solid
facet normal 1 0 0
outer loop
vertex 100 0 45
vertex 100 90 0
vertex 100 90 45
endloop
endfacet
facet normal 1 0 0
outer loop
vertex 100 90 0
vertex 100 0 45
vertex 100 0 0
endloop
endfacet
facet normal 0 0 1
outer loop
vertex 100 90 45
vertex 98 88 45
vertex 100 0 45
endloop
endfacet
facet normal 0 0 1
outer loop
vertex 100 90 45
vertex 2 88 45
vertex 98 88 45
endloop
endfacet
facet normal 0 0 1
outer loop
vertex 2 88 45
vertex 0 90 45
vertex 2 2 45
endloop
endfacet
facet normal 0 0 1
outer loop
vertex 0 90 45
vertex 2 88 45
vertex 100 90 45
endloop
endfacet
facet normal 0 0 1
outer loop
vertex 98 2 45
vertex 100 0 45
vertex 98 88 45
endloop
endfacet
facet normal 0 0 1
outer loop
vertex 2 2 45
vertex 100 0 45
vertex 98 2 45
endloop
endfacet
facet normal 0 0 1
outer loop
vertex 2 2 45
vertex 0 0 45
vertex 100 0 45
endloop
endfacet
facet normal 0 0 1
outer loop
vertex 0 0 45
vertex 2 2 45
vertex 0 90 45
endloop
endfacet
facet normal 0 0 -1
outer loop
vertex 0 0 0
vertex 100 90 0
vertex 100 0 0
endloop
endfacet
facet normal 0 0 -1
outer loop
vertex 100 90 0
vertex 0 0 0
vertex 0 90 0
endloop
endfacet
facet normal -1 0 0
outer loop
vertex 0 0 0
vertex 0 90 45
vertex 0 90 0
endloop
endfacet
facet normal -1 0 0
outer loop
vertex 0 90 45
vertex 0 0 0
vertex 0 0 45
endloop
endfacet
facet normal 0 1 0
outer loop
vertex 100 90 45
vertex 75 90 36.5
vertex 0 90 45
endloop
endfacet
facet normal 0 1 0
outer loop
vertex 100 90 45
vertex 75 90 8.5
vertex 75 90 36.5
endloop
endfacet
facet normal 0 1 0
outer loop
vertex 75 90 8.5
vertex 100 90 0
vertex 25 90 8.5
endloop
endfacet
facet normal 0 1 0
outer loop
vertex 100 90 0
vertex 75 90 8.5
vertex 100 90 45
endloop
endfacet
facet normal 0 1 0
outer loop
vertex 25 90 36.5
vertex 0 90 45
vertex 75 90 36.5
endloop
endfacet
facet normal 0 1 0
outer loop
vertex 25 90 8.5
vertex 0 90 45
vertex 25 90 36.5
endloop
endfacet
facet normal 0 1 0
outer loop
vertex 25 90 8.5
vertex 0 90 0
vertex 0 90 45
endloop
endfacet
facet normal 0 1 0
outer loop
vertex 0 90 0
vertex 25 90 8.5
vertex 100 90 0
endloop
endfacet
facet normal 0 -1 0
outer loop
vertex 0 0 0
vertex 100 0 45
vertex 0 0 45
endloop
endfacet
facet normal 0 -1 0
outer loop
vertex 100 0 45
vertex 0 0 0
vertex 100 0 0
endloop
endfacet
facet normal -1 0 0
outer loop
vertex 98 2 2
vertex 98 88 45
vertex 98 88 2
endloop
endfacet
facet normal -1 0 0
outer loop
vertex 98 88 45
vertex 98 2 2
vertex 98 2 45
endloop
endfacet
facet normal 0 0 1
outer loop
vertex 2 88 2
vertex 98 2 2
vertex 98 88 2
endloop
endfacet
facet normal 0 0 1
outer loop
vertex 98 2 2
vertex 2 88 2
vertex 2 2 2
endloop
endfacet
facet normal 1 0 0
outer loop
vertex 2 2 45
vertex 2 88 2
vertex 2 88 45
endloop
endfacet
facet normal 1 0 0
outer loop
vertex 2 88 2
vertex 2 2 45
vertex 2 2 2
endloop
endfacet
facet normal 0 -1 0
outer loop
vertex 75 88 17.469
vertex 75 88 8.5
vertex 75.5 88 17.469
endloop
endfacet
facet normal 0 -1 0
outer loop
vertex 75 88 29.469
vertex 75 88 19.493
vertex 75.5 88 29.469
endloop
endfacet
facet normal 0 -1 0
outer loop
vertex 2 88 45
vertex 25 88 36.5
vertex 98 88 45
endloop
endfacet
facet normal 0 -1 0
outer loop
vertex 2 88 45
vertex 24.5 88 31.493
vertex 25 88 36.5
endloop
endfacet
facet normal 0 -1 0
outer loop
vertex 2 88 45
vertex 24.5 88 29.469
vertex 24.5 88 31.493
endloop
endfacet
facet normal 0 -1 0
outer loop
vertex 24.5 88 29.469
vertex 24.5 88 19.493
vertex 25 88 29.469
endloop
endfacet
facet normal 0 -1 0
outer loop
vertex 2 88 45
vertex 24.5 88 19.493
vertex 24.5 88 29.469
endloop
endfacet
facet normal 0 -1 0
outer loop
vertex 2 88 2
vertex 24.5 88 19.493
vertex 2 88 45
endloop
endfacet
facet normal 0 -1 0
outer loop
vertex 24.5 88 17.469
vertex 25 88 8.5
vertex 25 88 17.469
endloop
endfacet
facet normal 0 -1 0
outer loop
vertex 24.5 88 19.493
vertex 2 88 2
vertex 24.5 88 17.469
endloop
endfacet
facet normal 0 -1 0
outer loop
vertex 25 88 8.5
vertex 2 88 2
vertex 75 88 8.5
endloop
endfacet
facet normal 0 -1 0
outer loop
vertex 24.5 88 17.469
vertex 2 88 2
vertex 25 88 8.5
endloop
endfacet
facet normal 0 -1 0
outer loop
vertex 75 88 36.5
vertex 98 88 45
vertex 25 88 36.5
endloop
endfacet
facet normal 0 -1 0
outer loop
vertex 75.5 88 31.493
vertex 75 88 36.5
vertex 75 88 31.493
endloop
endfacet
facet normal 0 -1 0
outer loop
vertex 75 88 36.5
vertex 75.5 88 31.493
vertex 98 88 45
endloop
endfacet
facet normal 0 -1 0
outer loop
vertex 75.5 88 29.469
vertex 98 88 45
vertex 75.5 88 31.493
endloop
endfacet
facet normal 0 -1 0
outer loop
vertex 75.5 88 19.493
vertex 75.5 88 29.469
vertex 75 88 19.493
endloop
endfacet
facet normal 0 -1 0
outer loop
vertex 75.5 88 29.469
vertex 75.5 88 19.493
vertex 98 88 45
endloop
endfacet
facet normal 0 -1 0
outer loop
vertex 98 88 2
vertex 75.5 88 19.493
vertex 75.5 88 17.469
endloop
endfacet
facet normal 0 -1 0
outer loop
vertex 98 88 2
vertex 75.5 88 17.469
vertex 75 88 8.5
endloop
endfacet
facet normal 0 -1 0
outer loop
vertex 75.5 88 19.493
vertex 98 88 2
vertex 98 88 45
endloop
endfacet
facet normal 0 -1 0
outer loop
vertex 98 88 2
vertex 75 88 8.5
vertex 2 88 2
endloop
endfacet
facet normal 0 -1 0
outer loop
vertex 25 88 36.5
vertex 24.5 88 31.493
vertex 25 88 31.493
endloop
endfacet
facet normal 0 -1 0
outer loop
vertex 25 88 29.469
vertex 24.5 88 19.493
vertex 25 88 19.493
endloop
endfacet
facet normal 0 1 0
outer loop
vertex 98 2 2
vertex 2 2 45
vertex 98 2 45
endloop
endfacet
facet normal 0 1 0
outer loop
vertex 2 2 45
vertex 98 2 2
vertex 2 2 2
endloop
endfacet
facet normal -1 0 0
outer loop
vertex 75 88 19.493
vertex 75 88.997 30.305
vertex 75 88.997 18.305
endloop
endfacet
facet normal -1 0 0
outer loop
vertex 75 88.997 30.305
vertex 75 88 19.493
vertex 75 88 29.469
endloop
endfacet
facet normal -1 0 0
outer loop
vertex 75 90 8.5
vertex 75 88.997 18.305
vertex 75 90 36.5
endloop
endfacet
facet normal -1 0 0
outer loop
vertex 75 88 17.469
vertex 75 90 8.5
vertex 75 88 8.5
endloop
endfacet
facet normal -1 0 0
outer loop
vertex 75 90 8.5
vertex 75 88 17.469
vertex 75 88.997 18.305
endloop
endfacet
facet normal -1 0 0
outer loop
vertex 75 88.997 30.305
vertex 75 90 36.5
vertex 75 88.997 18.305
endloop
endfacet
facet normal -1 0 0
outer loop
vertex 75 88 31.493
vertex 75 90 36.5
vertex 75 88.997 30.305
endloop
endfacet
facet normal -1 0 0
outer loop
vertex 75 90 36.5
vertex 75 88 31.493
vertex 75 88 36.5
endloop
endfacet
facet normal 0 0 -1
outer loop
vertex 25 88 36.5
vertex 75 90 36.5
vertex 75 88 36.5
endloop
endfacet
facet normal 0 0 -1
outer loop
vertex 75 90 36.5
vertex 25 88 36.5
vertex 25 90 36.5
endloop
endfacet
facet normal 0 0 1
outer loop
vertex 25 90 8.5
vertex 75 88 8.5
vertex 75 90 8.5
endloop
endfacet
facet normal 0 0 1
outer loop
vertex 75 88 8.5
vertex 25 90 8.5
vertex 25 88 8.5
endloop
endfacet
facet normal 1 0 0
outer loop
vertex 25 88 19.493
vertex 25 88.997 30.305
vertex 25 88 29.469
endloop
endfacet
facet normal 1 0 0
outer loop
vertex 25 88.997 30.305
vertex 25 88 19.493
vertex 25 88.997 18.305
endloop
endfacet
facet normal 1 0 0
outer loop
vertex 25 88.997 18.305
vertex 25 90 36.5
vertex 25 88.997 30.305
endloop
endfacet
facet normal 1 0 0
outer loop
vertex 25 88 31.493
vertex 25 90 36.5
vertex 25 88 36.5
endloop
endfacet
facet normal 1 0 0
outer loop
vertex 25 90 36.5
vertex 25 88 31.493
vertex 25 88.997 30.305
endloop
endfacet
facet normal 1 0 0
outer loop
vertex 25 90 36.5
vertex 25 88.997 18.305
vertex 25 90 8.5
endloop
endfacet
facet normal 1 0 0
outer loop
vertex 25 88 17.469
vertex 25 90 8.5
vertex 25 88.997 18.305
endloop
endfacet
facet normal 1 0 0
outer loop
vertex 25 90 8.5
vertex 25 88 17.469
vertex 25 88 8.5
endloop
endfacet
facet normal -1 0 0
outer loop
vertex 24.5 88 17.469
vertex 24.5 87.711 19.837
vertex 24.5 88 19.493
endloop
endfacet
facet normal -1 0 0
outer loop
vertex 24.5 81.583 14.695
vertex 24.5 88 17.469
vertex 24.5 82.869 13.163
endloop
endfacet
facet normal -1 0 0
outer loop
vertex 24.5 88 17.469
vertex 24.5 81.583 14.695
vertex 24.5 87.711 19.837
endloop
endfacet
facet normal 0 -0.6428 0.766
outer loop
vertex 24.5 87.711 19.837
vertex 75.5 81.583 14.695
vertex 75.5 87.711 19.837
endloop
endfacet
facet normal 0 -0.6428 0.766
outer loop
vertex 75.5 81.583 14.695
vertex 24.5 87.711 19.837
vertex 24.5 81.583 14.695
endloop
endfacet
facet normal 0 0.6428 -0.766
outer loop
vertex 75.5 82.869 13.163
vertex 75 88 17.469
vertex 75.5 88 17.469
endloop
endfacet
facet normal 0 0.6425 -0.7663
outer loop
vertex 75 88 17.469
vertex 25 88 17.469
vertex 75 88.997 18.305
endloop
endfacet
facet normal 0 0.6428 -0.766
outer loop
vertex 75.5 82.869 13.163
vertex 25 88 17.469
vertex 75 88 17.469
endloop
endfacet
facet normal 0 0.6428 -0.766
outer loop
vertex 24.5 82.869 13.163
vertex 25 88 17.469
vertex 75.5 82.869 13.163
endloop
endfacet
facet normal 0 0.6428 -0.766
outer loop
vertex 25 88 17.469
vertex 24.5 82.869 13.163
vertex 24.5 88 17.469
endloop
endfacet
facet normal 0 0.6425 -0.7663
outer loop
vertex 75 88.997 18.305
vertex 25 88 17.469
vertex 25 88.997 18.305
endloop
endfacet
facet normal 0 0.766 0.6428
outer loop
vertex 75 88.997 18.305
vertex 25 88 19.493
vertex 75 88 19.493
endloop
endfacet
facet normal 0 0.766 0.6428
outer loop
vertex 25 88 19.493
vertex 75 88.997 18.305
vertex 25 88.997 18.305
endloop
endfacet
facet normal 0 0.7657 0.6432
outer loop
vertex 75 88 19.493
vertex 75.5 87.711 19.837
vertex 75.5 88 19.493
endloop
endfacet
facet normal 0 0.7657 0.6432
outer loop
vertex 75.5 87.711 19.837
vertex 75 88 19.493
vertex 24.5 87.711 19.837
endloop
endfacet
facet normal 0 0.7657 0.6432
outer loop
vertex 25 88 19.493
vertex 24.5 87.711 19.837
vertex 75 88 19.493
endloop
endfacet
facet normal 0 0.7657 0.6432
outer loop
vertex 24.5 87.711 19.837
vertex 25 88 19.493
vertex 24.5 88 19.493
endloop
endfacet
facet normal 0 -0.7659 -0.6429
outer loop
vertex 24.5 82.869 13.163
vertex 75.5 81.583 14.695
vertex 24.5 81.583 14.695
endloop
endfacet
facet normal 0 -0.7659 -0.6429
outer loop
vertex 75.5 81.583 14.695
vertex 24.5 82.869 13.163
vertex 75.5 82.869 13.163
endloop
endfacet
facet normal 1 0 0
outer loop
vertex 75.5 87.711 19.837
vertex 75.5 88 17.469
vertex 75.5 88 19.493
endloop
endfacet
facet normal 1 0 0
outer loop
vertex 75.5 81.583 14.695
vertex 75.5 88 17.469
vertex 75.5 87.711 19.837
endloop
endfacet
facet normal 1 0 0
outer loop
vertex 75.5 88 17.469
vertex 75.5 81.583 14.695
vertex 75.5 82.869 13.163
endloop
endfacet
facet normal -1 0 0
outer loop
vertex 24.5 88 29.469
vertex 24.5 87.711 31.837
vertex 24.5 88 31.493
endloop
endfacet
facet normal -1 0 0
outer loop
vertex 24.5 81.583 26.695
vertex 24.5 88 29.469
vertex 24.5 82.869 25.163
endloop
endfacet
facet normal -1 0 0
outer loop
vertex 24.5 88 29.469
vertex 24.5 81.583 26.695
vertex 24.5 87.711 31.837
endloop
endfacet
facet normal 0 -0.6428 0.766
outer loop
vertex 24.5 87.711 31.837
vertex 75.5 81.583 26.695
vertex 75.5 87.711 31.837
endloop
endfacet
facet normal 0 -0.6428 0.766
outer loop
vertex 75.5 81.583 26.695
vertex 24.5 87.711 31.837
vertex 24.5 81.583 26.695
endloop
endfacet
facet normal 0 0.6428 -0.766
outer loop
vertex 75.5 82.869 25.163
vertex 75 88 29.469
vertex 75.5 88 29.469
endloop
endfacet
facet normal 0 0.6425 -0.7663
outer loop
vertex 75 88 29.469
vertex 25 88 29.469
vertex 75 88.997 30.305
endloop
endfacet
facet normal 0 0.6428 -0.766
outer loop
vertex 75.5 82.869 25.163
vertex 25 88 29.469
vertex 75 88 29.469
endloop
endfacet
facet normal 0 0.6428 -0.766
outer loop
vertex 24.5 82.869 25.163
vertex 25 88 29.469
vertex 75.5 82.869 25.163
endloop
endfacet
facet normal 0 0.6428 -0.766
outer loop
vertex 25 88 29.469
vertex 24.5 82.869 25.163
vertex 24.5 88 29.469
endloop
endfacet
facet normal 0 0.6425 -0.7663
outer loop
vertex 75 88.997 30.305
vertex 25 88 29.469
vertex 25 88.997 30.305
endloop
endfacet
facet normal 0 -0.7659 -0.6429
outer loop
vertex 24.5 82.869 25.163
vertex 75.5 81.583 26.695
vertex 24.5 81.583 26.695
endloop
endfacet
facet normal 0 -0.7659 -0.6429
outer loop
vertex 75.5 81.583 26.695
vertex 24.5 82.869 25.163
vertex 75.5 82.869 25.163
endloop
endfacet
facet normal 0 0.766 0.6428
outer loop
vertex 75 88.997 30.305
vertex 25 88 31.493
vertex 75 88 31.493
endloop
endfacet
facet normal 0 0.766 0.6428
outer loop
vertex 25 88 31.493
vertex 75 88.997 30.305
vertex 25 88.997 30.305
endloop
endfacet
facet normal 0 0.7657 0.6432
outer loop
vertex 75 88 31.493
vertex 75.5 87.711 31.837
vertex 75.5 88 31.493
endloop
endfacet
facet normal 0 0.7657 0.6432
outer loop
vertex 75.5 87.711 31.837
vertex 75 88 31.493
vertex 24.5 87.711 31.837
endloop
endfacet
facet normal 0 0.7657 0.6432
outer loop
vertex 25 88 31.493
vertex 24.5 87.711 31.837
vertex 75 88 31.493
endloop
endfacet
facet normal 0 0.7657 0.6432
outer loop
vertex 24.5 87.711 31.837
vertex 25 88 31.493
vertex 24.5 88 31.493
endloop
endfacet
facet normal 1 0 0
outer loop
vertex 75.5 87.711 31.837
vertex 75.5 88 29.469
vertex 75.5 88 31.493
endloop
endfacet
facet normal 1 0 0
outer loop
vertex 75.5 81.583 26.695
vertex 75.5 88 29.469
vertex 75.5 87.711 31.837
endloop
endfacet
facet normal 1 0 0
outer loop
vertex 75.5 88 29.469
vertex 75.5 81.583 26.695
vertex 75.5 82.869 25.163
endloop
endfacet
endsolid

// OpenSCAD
$fn = 32;

// ----------------------------------------------------------------------
// Vent box: louvers enclosure
// ----------------------------------------------------------------------

// --- parameters (mm) ---
box_l = 100;              // box length, X
box_w = 90;               // box width, Y
box_h = 45;               // box height, Z
wall_t = 2;               // shell wall thickness
win_l = 50;               // vent window width, X
win_h = 28;               // vent window height, Z
slat_t = 2;               // louver slat thickness
slat_d = 8;               // louver slat depth
slat_a = 40;              // louver slat angle, degrees
slat_pitch = 12;          // louver pitch
slat_yc = 85.29;          // slat centreline Y

win_z0 = (box_h - win_h) / 2;  // window lower edge Z
n_slats = 2;  // louver count
slat_z0 = win_z0 + (win_h - (n_slats - 1) * slat_pitch) / 2;

difference() {
  union() {
    difference() {
      cube([box_l, box_w, box_h]);
  translate([wall_t, wall_t, wall_t])
    cube([box_l - 2 * wall_t, box_w - 2 * wall_t, box_h]);
  translate([(box_l - win_l) / 2, box_w - wall_t - 1, win_z0])
    cube([win_l, wall_t + 2, win_h]);
    }
    for (i = [0 : n_slats - 1])
      translate([box_l / 2, slat_yc, slat_z0 + i * slat_pitch])
        rotate([slat_a, 0, 0])
          cube([win_l + 1, slat_d, slat_t], center = true);
  }
}
